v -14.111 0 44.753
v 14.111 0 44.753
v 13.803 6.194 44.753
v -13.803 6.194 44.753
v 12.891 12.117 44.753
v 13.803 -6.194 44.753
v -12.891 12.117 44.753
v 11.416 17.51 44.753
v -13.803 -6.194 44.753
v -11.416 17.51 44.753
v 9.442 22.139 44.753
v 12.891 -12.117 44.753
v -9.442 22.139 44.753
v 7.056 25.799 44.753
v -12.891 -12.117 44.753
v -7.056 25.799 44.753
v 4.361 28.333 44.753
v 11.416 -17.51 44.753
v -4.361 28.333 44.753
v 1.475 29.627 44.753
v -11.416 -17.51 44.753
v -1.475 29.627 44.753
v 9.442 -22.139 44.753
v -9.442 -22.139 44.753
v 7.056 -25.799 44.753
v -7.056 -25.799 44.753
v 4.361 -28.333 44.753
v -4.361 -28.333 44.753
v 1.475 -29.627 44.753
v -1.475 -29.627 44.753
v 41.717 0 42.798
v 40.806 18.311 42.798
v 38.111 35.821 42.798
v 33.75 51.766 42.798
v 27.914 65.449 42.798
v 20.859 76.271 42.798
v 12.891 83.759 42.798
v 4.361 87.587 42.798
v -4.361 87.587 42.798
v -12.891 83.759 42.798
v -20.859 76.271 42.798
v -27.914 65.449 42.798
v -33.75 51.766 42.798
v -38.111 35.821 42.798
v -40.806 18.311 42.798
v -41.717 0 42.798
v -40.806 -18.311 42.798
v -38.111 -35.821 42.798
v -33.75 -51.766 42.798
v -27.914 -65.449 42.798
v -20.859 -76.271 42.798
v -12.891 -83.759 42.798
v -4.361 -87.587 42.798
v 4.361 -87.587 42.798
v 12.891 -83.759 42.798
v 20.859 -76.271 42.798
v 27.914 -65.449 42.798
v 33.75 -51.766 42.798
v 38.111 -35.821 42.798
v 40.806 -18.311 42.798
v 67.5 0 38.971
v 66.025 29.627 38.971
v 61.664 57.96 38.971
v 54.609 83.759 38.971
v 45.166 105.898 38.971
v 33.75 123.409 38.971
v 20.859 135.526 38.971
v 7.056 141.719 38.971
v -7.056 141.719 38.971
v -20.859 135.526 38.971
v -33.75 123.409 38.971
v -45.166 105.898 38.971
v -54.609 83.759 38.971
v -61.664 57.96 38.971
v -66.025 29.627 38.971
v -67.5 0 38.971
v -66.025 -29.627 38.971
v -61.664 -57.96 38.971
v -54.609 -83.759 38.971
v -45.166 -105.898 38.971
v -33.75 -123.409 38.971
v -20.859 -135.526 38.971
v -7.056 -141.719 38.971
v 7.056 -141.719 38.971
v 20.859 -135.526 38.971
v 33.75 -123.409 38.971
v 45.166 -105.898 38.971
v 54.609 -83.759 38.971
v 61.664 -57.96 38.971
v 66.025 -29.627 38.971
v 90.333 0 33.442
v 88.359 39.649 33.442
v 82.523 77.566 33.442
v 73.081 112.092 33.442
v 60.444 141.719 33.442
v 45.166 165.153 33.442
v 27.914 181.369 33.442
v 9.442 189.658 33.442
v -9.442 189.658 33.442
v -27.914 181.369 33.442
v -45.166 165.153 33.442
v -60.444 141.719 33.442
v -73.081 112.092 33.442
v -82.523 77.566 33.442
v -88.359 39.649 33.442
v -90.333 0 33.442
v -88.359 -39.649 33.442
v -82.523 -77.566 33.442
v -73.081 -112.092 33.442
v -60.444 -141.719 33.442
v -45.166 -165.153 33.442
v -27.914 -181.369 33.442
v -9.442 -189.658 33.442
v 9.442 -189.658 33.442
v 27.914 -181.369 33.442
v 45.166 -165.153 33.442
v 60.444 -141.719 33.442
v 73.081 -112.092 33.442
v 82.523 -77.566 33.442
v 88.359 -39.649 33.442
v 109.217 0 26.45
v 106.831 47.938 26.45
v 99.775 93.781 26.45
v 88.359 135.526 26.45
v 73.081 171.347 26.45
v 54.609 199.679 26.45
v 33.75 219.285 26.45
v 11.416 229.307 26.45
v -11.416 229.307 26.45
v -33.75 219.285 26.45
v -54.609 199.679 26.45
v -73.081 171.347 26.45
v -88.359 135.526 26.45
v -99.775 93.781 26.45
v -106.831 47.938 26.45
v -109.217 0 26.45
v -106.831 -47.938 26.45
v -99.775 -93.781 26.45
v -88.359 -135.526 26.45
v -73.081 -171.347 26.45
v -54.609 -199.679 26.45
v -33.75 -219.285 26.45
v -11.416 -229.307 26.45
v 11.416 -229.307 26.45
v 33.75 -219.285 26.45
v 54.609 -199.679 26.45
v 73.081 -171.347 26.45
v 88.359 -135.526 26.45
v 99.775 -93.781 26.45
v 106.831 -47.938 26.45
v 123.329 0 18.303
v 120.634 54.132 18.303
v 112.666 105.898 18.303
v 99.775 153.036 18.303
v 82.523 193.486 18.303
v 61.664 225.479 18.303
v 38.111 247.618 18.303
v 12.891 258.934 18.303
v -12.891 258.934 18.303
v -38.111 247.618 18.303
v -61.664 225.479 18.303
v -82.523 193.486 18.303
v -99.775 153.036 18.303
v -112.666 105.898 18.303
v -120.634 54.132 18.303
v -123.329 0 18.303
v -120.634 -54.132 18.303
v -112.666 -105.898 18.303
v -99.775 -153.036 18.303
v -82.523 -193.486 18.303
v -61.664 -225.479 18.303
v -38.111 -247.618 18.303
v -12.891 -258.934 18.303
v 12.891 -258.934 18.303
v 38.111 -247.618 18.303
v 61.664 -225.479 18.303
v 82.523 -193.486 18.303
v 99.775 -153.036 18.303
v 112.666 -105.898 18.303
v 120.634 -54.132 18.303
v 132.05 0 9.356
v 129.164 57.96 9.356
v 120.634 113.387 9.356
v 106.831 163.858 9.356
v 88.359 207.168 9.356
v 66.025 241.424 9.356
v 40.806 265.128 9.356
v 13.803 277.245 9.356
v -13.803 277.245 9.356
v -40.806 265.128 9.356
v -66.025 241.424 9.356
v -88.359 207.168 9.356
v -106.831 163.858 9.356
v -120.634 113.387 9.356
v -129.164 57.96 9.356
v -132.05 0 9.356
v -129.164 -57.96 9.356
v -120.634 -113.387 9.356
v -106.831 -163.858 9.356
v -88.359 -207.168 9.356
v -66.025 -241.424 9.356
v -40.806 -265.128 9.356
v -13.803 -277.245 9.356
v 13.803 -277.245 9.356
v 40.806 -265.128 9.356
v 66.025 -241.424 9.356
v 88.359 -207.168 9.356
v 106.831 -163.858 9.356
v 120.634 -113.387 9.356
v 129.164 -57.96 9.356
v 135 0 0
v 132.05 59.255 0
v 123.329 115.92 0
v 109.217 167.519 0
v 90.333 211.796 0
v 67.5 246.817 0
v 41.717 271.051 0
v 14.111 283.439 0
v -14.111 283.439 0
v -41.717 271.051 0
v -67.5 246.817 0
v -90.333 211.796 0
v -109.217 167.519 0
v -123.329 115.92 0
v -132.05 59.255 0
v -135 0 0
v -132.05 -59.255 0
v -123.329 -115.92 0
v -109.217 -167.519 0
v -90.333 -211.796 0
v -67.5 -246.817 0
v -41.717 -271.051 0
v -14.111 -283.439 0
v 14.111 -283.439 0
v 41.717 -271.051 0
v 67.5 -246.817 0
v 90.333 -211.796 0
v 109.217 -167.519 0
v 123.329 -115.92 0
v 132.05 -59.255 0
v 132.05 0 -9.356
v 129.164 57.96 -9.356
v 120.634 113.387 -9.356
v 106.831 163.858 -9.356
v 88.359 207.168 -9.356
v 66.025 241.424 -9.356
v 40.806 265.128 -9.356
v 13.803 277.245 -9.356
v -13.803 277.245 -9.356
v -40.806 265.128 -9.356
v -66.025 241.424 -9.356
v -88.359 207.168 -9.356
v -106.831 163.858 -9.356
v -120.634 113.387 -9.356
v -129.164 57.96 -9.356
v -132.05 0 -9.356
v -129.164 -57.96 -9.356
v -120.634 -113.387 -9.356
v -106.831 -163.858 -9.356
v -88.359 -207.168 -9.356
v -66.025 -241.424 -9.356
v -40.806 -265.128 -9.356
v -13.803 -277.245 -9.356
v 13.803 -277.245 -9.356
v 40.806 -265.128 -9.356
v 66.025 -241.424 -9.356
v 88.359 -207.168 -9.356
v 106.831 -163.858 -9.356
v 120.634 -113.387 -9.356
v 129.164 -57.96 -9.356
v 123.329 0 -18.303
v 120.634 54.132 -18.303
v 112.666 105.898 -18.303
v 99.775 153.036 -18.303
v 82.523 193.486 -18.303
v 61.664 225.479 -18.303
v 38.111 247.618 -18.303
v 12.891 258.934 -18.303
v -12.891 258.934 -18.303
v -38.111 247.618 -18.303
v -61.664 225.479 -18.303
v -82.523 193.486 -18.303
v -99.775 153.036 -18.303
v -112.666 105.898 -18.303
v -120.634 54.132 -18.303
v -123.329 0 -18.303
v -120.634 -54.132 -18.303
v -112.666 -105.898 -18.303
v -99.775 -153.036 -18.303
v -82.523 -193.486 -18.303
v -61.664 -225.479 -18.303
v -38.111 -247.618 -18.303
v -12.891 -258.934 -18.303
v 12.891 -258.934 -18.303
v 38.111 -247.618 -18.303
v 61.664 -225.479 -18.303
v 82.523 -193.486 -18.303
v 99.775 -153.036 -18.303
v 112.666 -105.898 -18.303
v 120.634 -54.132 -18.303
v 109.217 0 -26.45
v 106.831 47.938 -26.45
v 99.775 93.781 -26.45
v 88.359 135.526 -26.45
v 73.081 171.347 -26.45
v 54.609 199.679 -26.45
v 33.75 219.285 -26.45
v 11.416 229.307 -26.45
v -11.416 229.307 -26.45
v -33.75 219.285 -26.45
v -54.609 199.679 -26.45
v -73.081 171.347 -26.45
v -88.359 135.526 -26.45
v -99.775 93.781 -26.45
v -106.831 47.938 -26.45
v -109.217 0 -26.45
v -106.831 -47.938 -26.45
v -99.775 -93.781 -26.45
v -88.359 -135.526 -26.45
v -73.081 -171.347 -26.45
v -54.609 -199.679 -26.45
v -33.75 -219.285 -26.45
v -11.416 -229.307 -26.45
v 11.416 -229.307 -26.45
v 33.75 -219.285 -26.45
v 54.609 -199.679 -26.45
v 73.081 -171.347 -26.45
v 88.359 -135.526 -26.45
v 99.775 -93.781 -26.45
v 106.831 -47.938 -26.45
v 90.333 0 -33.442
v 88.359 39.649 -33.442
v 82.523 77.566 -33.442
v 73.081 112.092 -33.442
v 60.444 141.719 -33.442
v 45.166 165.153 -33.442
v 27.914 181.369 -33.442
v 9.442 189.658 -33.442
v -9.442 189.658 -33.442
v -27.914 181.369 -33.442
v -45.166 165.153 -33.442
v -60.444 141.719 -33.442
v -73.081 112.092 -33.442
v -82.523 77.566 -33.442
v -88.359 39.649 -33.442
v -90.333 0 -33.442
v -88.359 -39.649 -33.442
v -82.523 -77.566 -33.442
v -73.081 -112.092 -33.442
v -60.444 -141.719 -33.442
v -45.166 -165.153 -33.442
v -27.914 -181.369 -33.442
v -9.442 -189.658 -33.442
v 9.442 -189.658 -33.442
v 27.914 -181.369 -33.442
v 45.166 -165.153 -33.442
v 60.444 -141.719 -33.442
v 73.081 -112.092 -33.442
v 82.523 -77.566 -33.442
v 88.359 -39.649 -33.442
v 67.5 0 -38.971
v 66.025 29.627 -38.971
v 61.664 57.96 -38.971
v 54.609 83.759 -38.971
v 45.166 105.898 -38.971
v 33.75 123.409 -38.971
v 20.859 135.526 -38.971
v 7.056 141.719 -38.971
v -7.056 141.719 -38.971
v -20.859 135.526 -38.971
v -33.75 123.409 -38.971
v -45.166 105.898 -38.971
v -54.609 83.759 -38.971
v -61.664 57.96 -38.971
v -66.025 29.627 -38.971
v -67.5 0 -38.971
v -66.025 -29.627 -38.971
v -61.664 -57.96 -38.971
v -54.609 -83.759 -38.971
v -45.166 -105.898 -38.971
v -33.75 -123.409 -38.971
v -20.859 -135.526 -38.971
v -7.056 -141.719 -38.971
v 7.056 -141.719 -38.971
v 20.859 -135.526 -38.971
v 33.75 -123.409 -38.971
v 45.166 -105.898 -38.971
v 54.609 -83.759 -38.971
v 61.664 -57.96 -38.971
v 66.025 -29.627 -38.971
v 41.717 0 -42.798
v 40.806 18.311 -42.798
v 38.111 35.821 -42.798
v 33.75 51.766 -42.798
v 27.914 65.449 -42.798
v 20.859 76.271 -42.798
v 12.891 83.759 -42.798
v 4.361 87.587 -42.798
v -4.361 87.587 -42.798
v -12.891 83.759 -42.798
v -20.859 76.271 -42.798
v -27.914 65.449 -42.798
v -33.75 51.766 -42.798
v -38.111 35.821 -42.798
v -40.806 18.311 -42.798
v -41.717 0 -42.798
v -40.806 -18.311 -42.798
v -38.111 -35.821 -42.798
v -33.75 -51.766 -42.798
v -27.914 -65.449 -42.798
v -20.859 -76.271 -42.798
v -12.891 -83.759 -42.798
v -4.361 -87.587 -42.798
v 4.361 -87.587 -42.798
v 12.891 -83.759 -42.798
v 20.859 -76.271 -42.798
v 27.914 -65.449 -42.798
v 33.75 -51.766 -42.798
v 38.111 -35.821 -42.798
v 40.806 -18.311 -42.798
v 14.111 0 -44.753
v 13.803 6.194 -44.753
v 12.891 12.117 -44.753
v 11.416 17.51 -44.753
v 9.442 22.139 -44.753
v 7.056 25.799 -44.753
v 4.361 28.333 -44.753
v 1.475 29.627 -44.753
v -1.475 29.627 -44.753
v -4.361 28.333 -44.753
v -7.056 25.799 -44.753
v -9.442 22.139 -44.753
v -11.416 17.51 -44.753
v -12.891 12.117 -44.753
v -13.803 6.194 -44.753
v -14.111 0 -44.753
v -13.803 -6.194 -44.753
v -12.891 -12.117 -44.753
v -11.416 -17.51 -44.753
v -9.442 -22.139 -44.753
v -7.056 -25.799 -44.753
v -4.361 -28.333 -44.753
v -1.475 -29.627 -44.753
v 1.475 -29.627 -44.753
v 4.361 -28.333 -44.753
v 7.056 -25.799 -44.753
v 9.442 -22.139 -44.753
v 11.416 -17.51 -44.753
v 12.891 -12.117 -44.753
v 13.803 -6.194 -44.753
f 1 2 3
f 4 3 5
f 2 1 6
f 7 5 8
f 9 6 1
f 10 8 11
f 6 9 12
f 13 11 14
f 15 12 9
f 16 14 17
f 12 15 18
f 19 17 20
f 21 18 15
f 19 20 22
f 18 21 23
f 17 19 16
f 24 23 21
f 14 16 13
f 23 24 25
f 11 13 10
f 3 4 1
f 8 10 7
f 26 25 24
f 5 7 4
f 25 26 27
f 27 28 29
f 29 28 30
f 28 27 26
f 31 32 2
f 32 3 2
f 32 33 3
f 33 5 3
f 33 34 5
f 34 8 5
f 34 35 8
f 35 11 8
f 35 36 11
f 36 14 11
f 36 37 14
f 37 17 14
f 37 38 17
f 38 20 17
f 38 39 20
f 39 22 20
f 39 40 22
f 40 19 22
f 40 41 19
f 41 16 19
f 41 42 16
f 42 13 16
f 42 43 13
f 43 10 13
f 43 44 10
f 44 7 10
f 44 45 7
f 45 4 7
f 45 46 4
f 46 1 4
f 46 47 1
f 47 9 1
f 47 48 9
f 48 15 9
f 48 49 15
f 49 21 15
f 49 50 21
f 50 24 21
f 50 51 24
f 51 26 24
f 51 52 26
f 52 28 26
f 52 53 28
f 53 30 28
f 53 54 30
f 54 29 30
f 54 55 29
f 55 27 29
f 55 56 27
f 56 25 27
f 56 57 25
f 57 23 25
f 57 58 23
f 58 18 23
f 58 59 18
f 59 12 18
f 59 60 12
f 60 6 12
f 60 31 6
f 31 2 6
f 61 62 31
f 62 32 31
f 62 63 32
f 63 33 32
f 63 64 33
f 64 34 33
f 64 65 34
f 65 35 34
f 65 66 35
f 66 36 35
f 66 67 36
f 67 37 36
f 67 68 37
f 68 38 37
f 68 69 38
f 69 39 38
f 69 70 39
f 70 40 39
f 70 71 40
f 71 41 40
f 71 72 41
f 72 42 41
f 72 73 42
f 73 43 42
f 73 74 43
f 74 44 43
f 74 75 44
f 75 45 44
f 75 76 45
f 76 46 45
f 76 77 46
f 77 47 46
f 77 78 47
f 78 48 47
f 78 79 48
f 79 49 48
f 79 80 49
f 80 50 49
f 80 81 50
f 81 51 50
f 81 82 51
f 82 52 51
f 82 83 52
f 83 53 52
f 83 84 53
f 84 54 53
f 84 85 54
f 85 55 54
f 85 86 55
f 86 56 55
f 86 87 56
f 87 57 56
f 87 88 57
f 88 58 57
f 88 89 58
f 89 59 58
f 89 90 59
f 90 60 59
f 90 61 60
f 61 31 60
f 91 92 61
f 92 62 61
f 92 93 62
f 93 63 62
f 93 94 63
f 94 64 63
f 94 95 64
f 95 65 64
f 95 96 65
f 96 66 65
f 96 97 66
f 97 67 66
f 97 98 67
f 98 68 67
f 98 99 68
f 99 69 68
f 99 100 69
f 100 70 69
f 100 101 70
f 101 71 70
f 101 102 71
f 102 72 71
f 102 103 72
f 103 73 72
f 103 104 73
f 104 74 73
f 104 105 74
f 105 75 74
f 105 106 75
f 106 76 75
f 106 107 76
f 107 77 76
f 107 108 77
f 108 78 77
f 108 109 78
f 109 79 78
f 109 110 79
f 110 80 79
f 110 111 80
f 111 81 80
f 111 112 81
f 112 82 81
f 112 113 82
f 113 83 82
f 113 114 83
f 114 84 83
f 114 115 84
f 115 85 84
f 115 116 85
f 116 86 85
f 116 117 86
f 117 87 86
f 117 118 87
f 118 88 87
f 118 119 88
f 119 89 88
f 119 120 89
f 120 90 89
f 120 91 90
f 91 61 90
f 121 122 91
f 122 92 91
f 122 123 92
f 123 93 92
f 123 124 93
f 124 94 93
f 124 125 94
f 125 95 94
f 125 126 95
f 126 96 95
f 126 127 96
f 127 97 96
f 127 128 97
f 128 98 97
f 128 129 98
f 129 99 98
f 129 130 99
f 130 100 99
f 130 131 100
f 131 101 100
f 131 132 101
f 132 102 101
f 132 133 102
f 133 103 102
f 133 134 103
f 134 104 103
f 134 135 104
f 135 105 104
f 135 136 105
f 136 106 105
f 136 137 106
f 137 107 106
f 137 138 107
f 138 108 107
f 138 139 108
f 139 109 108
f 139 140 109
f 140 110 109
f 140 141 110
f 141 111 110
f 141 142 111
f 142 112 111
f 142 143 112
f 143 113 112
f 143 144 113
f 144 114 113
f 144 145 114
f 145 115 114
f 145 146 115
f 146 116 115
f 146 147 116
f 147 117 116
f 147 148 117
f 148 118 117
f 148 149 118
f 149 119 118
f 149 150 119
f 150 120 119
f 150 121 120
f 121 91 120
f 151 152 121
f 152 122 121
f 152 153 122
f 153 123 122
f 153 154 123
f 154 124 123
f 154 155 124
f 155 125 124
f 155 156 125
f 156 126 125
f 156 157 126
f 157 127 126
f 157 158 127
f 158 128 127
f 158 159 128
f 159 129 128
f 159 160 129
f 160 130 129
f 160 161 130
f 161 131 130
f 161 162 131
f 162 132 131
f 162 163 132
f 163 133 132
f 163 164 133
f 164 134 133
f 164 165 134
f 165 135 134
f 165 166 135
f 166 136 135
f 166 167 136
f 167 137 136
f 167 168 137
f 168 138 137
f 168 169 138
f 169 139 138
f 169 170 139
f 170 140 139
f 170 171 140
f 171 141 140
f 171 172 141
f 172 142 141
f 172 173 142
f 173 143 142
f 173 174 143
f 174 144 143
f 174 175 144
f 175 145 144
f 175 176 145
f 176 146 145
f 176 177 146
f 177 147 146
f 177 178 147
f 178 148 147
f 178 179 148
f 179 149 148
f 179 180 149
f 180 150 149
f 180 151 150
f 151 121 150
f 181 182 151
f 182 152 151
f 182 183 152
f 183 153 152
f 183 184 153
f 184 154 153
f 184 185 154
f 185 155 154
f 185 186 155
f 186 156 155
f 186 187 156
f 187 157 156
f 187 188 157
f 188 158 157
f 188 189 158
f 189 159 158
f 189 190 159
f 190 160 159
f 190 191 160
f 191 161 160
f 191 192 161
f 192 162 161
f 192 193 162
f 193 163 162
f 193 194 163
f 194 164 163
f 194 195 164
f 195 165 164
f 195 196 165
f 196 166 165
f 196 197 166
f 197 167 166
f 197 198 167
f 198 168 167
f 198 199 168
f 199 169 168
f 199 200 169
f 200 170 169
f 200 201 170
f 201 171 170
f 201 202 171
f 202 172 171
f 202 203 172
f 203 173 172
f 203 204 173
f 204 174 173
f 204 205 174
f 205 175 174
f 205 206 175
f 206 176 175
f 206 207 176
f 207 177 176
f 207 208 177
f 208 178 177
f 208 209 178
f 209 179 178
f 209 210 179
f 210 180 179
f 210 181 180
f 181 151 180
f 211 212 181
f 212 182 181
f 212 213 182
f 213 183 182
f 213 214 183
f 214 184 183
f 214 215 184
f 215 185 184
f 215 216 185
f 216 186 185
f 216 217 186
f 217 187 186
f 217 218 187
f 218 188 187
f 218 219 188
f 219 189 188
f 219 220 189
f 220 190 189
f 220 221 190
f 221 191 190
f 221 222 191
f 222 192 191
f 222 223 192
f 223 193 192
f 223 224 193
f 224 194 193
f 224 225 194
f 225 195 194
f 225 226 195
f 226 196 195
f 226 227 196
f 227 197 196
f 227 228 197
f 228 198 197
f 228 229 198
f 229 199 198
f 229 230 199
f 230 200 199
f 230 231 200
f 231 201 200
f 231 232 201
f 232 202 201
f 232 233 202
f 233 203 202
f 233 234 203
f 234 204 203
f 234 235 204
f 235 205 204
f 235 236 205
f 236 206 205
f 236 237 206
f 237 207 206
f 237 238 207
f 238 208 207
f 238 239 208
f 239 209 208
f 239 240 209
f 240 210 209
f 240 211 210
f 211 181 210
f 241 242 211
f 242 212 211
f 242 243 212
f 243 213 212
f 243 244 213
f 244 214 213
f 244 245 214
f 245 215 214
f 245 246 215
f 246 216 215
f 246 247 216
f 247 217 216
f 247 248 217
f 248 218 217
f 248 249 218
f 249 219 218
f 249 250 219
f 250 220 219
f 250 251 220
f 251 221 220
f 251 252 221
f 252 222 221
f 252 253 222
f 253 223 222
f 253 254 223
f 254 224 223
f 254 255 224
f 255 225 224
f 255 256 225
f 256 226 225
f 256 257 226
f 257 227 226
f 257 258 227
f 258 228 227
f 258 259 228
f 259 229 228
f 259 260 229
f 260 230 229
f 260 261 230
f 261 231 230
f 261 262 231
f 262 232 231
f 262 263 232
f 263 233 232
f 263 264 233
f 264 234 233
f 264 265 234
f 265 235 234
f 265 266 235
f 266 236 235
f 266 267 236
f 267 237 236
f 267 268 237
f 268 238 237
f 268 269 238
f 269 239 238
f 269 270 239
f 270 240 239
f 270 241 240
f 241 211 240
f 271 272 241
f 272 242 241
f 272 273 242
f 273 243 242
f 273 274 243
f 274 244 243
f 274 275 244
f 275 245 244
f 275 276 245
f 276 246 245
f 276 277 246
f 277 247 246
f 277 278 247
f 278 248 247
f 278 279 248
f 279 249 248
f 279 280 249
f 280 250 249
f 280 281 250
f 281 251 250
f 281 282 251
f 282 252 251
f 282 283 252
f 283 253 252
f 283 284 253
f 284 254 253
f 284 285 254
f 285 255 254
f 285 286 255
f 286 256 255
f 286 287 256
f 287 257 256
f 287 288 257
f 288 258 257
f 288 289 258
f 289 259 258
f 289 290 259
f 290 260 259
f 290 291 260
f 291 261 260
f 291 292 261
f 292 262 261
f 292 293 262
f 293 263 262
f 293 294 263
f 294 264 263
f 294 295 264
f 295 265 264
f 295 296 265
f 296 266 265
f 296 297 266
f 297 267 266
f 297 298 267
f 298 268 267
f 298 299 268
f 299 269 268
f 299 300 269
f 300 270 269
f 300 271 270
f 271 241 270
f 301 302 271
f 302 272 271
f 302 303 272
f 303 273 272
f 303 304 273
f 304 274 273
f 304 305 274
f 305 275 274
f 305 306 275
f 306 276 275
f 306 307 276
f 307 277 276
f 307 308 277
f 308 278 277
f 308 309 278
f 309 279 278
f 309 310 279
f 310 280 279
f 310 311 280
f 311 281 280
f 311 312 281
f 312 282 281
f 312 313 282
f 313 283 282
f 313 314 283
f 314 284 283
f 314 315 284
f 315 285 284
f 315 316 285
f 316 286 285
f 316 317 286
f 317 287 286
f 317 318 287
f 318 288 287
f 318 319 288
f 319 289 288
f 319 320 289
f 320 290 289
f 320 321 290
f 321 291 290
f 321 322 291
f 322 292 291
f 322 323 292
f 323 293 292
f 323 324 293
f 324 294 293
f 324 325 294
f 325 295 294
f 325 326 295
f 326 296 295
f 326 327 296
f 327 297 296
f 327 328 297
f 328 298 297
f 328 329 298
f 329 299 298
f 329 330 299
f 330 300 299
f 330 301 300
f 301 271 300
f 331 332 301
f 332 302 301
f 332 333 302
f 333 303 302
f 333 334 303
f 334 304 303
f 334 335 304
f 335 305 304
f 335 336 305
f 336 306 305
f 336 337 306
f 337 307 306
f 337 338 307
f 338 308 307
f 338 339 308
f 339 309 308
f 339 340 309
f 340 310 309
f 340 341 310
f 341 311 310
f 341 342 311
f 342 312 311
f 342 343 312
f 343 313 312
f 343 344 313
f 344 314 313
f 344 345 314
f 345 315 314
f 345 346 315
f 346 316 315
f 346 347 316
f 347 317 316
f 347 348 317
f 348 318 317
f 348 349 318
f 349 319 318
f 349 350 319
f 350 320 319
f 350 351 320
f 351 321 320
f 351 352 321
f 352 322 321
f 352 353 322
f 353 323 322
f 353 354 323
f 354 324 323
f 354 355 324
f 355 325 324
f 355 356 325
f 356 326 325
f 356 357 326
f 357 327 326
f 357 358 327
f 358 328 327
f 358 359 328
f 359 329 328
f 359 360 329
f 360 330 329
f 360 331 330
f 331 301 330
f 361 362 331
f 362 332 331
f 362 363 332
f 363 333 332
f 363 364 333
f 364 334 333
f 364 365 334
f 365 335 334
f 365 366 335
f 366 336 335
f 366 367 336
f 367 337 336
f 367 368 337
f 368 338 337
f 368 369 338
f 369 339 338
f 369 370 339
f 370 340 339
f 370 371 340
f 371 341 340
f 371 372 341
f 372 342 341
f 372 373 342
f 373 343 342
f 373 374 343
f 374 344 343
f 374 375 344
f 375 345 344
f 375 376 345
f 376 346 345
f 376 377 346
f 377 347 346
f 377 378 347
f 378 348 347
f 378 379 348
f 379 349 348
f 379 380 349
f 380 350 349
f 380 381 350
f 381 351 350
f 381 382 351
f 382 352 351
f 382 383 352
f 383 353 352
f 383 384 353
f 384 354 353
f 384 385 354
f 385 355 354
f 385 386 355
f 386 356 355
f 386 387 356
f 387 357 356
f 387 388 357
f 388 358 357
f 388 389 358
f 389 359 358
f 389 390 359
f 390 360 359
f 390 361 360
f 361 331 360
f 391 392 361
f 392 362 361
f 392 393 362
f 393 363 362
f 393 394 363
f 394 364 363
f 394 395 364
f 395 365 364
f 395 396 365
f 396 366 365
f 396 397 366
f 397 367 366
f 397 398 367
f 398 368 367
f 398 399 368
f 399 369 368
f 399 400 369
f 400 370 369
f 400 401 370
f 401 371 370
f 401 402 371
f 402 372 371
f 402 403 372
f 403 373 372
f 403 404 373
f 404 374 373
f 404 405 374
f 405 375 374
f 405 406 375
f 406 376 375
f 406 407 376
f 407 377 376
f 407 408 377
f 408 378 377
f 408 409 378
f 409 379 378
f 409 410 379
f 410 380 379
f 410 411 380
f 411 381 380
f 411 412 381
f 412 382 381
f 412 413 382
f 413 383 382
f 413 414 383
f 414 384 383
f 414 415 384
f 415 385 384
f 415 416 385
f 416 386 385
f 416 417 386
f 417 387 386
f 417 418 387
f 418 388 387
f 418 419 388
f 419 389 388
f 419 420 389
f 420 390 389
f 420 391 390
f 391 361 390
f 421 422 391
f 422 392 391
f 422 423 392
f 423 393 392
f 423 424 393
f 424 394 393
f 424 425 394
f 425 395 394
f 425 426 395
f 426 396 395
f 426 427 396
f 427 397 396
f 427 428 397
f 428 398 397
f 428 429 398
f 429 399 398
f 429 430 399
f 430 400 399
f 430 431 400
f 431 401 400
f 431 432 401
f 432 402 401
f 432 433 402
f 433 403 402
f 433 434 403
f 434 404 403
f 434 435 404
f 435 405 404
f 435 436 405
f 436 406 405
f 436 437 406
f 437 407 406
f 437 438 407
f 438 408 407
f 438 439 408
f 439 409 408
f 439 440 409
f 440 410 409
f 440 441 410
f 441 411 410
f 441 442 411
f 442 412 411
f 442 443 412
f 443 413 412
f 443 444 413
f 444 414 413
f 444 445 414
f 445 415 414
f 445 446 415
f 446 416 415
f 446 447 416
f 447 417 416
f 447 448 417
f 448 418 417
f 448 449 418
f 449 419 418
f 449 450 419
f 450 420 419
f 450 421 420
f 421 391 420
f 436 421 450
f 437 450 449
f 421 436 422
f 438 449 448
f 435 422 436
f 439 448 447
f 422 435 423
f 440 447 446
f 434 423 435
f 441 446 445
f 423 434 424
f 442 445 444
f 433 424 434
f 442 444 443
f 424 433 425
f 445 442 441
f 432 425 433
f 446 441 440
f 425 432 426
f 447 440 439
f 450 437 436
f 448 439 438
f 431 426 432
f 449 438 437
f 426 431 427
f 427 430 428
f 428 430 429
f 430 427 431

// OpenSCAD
// Generated by SolidPython 1.0.1 on 2020-07-29 00:46:49


scale(v = [9, 19, 3]) {
	sphere(r = 15);
}
/***********************************************
*********      SolidPython code:      **********
************************************************
 
# import packages: SolidPython
from solid import *
from solid.utils import *
from itertools import chain, combinations, permutations


class Resize:

    def __init__(self, scad_file):
        self.scad_file = scad_file
        #self.scad_file = import_scad(scad_file)
        # cone/cylinder param:
        self.r1 = 0
        self.r2 = 0
        self.h = 0
        # rectangular prism param:
        self.w = 0
        self.l = 0
        # ellipse param:
        self.r = 0

    # import OpenScad code (file name corresponds to shape)


    # classify shape + parameters
    def assign(self, param1, param2, param3):
        if self.scad_file == 'cone.scad':
            self.r1 = param1
            self.r2 = param2
            self.h = param3
        elif self.scad_file == 'cylinder.scad':
            self.r1 = param1
            self.r2 = param2
            self.h = param3
        elif self.scad_file == 'rectangularPrism.scad':
            self.h = param1
            self.l = param2
            self.w = param3
        else:
            self.r = param1
            self.h = param2

    # resize parameters
    def iterate(self):
        x = range(3, 20, 2)
        i = 1
        if self.scad_file == 'cone.scad':
            tempList = list(permutations(x, 2))
            for temp in tempList:
                param1 = temp[0]
                param2 = temp[1]
                filepath = 'produced_scad_files/' + 'cone' + str(param1) + '_' + str(param2) + '_' + '.scad'
                scad_render_to_file(cylinder(h=param1, r1=param2, r2=0), filepath)

        elif self.scad_file == 'cylinder.scad':
            tempList = list(permutations(x, 3))
            for temp in tempList:
                param1 = temp[0]
                param2 = temp[1]
                filepath = 'produced_scad_files/' + 'cylinder' + str(param1) + '_' + str(param2) + '_' + '.scad'
                scad_render_to_file(cylinder(h=param1, r1=param2, r2=param2), filepath)

        elif self.scad_file == 'rectangularPrism.scad':
            tempList = list(permutations(x, 3))
            for temp in tempList:
                param1 = temp[0]
                param2 = temp[1]
                param3 = temp[2]
                filepath = 'produced_scad_files/' + 'rectangularPrism' + str(param1) + '_' + str(param2) + '_' + str(
                    param3) + '.scad'
                scad_render_to_file(cube(size=(param1, param2, param3)), filepath)

        elif self.scad_file == 'ellipse.scad':
            tempList = list(permutations(x, 4))
            for temp in tempList:
                param1 = temp[0]
                param2 = temp[1]
                param3 = temp[2]
                param4 = temp[3]
                filepath = 'produced_scad_files/' + 'ellipse' + str(param1) + '_' + str(param2) + '_' + str(param3) + '_' + str(param4) + '.scad'
                scad_render_to_file(scale([param1, param2, param3])(sphere(r=param4)), filepath)

    def render_to_scadfile(self):
        scad_render_to_file(scad, 'example.scad') 
 
************************************************/
